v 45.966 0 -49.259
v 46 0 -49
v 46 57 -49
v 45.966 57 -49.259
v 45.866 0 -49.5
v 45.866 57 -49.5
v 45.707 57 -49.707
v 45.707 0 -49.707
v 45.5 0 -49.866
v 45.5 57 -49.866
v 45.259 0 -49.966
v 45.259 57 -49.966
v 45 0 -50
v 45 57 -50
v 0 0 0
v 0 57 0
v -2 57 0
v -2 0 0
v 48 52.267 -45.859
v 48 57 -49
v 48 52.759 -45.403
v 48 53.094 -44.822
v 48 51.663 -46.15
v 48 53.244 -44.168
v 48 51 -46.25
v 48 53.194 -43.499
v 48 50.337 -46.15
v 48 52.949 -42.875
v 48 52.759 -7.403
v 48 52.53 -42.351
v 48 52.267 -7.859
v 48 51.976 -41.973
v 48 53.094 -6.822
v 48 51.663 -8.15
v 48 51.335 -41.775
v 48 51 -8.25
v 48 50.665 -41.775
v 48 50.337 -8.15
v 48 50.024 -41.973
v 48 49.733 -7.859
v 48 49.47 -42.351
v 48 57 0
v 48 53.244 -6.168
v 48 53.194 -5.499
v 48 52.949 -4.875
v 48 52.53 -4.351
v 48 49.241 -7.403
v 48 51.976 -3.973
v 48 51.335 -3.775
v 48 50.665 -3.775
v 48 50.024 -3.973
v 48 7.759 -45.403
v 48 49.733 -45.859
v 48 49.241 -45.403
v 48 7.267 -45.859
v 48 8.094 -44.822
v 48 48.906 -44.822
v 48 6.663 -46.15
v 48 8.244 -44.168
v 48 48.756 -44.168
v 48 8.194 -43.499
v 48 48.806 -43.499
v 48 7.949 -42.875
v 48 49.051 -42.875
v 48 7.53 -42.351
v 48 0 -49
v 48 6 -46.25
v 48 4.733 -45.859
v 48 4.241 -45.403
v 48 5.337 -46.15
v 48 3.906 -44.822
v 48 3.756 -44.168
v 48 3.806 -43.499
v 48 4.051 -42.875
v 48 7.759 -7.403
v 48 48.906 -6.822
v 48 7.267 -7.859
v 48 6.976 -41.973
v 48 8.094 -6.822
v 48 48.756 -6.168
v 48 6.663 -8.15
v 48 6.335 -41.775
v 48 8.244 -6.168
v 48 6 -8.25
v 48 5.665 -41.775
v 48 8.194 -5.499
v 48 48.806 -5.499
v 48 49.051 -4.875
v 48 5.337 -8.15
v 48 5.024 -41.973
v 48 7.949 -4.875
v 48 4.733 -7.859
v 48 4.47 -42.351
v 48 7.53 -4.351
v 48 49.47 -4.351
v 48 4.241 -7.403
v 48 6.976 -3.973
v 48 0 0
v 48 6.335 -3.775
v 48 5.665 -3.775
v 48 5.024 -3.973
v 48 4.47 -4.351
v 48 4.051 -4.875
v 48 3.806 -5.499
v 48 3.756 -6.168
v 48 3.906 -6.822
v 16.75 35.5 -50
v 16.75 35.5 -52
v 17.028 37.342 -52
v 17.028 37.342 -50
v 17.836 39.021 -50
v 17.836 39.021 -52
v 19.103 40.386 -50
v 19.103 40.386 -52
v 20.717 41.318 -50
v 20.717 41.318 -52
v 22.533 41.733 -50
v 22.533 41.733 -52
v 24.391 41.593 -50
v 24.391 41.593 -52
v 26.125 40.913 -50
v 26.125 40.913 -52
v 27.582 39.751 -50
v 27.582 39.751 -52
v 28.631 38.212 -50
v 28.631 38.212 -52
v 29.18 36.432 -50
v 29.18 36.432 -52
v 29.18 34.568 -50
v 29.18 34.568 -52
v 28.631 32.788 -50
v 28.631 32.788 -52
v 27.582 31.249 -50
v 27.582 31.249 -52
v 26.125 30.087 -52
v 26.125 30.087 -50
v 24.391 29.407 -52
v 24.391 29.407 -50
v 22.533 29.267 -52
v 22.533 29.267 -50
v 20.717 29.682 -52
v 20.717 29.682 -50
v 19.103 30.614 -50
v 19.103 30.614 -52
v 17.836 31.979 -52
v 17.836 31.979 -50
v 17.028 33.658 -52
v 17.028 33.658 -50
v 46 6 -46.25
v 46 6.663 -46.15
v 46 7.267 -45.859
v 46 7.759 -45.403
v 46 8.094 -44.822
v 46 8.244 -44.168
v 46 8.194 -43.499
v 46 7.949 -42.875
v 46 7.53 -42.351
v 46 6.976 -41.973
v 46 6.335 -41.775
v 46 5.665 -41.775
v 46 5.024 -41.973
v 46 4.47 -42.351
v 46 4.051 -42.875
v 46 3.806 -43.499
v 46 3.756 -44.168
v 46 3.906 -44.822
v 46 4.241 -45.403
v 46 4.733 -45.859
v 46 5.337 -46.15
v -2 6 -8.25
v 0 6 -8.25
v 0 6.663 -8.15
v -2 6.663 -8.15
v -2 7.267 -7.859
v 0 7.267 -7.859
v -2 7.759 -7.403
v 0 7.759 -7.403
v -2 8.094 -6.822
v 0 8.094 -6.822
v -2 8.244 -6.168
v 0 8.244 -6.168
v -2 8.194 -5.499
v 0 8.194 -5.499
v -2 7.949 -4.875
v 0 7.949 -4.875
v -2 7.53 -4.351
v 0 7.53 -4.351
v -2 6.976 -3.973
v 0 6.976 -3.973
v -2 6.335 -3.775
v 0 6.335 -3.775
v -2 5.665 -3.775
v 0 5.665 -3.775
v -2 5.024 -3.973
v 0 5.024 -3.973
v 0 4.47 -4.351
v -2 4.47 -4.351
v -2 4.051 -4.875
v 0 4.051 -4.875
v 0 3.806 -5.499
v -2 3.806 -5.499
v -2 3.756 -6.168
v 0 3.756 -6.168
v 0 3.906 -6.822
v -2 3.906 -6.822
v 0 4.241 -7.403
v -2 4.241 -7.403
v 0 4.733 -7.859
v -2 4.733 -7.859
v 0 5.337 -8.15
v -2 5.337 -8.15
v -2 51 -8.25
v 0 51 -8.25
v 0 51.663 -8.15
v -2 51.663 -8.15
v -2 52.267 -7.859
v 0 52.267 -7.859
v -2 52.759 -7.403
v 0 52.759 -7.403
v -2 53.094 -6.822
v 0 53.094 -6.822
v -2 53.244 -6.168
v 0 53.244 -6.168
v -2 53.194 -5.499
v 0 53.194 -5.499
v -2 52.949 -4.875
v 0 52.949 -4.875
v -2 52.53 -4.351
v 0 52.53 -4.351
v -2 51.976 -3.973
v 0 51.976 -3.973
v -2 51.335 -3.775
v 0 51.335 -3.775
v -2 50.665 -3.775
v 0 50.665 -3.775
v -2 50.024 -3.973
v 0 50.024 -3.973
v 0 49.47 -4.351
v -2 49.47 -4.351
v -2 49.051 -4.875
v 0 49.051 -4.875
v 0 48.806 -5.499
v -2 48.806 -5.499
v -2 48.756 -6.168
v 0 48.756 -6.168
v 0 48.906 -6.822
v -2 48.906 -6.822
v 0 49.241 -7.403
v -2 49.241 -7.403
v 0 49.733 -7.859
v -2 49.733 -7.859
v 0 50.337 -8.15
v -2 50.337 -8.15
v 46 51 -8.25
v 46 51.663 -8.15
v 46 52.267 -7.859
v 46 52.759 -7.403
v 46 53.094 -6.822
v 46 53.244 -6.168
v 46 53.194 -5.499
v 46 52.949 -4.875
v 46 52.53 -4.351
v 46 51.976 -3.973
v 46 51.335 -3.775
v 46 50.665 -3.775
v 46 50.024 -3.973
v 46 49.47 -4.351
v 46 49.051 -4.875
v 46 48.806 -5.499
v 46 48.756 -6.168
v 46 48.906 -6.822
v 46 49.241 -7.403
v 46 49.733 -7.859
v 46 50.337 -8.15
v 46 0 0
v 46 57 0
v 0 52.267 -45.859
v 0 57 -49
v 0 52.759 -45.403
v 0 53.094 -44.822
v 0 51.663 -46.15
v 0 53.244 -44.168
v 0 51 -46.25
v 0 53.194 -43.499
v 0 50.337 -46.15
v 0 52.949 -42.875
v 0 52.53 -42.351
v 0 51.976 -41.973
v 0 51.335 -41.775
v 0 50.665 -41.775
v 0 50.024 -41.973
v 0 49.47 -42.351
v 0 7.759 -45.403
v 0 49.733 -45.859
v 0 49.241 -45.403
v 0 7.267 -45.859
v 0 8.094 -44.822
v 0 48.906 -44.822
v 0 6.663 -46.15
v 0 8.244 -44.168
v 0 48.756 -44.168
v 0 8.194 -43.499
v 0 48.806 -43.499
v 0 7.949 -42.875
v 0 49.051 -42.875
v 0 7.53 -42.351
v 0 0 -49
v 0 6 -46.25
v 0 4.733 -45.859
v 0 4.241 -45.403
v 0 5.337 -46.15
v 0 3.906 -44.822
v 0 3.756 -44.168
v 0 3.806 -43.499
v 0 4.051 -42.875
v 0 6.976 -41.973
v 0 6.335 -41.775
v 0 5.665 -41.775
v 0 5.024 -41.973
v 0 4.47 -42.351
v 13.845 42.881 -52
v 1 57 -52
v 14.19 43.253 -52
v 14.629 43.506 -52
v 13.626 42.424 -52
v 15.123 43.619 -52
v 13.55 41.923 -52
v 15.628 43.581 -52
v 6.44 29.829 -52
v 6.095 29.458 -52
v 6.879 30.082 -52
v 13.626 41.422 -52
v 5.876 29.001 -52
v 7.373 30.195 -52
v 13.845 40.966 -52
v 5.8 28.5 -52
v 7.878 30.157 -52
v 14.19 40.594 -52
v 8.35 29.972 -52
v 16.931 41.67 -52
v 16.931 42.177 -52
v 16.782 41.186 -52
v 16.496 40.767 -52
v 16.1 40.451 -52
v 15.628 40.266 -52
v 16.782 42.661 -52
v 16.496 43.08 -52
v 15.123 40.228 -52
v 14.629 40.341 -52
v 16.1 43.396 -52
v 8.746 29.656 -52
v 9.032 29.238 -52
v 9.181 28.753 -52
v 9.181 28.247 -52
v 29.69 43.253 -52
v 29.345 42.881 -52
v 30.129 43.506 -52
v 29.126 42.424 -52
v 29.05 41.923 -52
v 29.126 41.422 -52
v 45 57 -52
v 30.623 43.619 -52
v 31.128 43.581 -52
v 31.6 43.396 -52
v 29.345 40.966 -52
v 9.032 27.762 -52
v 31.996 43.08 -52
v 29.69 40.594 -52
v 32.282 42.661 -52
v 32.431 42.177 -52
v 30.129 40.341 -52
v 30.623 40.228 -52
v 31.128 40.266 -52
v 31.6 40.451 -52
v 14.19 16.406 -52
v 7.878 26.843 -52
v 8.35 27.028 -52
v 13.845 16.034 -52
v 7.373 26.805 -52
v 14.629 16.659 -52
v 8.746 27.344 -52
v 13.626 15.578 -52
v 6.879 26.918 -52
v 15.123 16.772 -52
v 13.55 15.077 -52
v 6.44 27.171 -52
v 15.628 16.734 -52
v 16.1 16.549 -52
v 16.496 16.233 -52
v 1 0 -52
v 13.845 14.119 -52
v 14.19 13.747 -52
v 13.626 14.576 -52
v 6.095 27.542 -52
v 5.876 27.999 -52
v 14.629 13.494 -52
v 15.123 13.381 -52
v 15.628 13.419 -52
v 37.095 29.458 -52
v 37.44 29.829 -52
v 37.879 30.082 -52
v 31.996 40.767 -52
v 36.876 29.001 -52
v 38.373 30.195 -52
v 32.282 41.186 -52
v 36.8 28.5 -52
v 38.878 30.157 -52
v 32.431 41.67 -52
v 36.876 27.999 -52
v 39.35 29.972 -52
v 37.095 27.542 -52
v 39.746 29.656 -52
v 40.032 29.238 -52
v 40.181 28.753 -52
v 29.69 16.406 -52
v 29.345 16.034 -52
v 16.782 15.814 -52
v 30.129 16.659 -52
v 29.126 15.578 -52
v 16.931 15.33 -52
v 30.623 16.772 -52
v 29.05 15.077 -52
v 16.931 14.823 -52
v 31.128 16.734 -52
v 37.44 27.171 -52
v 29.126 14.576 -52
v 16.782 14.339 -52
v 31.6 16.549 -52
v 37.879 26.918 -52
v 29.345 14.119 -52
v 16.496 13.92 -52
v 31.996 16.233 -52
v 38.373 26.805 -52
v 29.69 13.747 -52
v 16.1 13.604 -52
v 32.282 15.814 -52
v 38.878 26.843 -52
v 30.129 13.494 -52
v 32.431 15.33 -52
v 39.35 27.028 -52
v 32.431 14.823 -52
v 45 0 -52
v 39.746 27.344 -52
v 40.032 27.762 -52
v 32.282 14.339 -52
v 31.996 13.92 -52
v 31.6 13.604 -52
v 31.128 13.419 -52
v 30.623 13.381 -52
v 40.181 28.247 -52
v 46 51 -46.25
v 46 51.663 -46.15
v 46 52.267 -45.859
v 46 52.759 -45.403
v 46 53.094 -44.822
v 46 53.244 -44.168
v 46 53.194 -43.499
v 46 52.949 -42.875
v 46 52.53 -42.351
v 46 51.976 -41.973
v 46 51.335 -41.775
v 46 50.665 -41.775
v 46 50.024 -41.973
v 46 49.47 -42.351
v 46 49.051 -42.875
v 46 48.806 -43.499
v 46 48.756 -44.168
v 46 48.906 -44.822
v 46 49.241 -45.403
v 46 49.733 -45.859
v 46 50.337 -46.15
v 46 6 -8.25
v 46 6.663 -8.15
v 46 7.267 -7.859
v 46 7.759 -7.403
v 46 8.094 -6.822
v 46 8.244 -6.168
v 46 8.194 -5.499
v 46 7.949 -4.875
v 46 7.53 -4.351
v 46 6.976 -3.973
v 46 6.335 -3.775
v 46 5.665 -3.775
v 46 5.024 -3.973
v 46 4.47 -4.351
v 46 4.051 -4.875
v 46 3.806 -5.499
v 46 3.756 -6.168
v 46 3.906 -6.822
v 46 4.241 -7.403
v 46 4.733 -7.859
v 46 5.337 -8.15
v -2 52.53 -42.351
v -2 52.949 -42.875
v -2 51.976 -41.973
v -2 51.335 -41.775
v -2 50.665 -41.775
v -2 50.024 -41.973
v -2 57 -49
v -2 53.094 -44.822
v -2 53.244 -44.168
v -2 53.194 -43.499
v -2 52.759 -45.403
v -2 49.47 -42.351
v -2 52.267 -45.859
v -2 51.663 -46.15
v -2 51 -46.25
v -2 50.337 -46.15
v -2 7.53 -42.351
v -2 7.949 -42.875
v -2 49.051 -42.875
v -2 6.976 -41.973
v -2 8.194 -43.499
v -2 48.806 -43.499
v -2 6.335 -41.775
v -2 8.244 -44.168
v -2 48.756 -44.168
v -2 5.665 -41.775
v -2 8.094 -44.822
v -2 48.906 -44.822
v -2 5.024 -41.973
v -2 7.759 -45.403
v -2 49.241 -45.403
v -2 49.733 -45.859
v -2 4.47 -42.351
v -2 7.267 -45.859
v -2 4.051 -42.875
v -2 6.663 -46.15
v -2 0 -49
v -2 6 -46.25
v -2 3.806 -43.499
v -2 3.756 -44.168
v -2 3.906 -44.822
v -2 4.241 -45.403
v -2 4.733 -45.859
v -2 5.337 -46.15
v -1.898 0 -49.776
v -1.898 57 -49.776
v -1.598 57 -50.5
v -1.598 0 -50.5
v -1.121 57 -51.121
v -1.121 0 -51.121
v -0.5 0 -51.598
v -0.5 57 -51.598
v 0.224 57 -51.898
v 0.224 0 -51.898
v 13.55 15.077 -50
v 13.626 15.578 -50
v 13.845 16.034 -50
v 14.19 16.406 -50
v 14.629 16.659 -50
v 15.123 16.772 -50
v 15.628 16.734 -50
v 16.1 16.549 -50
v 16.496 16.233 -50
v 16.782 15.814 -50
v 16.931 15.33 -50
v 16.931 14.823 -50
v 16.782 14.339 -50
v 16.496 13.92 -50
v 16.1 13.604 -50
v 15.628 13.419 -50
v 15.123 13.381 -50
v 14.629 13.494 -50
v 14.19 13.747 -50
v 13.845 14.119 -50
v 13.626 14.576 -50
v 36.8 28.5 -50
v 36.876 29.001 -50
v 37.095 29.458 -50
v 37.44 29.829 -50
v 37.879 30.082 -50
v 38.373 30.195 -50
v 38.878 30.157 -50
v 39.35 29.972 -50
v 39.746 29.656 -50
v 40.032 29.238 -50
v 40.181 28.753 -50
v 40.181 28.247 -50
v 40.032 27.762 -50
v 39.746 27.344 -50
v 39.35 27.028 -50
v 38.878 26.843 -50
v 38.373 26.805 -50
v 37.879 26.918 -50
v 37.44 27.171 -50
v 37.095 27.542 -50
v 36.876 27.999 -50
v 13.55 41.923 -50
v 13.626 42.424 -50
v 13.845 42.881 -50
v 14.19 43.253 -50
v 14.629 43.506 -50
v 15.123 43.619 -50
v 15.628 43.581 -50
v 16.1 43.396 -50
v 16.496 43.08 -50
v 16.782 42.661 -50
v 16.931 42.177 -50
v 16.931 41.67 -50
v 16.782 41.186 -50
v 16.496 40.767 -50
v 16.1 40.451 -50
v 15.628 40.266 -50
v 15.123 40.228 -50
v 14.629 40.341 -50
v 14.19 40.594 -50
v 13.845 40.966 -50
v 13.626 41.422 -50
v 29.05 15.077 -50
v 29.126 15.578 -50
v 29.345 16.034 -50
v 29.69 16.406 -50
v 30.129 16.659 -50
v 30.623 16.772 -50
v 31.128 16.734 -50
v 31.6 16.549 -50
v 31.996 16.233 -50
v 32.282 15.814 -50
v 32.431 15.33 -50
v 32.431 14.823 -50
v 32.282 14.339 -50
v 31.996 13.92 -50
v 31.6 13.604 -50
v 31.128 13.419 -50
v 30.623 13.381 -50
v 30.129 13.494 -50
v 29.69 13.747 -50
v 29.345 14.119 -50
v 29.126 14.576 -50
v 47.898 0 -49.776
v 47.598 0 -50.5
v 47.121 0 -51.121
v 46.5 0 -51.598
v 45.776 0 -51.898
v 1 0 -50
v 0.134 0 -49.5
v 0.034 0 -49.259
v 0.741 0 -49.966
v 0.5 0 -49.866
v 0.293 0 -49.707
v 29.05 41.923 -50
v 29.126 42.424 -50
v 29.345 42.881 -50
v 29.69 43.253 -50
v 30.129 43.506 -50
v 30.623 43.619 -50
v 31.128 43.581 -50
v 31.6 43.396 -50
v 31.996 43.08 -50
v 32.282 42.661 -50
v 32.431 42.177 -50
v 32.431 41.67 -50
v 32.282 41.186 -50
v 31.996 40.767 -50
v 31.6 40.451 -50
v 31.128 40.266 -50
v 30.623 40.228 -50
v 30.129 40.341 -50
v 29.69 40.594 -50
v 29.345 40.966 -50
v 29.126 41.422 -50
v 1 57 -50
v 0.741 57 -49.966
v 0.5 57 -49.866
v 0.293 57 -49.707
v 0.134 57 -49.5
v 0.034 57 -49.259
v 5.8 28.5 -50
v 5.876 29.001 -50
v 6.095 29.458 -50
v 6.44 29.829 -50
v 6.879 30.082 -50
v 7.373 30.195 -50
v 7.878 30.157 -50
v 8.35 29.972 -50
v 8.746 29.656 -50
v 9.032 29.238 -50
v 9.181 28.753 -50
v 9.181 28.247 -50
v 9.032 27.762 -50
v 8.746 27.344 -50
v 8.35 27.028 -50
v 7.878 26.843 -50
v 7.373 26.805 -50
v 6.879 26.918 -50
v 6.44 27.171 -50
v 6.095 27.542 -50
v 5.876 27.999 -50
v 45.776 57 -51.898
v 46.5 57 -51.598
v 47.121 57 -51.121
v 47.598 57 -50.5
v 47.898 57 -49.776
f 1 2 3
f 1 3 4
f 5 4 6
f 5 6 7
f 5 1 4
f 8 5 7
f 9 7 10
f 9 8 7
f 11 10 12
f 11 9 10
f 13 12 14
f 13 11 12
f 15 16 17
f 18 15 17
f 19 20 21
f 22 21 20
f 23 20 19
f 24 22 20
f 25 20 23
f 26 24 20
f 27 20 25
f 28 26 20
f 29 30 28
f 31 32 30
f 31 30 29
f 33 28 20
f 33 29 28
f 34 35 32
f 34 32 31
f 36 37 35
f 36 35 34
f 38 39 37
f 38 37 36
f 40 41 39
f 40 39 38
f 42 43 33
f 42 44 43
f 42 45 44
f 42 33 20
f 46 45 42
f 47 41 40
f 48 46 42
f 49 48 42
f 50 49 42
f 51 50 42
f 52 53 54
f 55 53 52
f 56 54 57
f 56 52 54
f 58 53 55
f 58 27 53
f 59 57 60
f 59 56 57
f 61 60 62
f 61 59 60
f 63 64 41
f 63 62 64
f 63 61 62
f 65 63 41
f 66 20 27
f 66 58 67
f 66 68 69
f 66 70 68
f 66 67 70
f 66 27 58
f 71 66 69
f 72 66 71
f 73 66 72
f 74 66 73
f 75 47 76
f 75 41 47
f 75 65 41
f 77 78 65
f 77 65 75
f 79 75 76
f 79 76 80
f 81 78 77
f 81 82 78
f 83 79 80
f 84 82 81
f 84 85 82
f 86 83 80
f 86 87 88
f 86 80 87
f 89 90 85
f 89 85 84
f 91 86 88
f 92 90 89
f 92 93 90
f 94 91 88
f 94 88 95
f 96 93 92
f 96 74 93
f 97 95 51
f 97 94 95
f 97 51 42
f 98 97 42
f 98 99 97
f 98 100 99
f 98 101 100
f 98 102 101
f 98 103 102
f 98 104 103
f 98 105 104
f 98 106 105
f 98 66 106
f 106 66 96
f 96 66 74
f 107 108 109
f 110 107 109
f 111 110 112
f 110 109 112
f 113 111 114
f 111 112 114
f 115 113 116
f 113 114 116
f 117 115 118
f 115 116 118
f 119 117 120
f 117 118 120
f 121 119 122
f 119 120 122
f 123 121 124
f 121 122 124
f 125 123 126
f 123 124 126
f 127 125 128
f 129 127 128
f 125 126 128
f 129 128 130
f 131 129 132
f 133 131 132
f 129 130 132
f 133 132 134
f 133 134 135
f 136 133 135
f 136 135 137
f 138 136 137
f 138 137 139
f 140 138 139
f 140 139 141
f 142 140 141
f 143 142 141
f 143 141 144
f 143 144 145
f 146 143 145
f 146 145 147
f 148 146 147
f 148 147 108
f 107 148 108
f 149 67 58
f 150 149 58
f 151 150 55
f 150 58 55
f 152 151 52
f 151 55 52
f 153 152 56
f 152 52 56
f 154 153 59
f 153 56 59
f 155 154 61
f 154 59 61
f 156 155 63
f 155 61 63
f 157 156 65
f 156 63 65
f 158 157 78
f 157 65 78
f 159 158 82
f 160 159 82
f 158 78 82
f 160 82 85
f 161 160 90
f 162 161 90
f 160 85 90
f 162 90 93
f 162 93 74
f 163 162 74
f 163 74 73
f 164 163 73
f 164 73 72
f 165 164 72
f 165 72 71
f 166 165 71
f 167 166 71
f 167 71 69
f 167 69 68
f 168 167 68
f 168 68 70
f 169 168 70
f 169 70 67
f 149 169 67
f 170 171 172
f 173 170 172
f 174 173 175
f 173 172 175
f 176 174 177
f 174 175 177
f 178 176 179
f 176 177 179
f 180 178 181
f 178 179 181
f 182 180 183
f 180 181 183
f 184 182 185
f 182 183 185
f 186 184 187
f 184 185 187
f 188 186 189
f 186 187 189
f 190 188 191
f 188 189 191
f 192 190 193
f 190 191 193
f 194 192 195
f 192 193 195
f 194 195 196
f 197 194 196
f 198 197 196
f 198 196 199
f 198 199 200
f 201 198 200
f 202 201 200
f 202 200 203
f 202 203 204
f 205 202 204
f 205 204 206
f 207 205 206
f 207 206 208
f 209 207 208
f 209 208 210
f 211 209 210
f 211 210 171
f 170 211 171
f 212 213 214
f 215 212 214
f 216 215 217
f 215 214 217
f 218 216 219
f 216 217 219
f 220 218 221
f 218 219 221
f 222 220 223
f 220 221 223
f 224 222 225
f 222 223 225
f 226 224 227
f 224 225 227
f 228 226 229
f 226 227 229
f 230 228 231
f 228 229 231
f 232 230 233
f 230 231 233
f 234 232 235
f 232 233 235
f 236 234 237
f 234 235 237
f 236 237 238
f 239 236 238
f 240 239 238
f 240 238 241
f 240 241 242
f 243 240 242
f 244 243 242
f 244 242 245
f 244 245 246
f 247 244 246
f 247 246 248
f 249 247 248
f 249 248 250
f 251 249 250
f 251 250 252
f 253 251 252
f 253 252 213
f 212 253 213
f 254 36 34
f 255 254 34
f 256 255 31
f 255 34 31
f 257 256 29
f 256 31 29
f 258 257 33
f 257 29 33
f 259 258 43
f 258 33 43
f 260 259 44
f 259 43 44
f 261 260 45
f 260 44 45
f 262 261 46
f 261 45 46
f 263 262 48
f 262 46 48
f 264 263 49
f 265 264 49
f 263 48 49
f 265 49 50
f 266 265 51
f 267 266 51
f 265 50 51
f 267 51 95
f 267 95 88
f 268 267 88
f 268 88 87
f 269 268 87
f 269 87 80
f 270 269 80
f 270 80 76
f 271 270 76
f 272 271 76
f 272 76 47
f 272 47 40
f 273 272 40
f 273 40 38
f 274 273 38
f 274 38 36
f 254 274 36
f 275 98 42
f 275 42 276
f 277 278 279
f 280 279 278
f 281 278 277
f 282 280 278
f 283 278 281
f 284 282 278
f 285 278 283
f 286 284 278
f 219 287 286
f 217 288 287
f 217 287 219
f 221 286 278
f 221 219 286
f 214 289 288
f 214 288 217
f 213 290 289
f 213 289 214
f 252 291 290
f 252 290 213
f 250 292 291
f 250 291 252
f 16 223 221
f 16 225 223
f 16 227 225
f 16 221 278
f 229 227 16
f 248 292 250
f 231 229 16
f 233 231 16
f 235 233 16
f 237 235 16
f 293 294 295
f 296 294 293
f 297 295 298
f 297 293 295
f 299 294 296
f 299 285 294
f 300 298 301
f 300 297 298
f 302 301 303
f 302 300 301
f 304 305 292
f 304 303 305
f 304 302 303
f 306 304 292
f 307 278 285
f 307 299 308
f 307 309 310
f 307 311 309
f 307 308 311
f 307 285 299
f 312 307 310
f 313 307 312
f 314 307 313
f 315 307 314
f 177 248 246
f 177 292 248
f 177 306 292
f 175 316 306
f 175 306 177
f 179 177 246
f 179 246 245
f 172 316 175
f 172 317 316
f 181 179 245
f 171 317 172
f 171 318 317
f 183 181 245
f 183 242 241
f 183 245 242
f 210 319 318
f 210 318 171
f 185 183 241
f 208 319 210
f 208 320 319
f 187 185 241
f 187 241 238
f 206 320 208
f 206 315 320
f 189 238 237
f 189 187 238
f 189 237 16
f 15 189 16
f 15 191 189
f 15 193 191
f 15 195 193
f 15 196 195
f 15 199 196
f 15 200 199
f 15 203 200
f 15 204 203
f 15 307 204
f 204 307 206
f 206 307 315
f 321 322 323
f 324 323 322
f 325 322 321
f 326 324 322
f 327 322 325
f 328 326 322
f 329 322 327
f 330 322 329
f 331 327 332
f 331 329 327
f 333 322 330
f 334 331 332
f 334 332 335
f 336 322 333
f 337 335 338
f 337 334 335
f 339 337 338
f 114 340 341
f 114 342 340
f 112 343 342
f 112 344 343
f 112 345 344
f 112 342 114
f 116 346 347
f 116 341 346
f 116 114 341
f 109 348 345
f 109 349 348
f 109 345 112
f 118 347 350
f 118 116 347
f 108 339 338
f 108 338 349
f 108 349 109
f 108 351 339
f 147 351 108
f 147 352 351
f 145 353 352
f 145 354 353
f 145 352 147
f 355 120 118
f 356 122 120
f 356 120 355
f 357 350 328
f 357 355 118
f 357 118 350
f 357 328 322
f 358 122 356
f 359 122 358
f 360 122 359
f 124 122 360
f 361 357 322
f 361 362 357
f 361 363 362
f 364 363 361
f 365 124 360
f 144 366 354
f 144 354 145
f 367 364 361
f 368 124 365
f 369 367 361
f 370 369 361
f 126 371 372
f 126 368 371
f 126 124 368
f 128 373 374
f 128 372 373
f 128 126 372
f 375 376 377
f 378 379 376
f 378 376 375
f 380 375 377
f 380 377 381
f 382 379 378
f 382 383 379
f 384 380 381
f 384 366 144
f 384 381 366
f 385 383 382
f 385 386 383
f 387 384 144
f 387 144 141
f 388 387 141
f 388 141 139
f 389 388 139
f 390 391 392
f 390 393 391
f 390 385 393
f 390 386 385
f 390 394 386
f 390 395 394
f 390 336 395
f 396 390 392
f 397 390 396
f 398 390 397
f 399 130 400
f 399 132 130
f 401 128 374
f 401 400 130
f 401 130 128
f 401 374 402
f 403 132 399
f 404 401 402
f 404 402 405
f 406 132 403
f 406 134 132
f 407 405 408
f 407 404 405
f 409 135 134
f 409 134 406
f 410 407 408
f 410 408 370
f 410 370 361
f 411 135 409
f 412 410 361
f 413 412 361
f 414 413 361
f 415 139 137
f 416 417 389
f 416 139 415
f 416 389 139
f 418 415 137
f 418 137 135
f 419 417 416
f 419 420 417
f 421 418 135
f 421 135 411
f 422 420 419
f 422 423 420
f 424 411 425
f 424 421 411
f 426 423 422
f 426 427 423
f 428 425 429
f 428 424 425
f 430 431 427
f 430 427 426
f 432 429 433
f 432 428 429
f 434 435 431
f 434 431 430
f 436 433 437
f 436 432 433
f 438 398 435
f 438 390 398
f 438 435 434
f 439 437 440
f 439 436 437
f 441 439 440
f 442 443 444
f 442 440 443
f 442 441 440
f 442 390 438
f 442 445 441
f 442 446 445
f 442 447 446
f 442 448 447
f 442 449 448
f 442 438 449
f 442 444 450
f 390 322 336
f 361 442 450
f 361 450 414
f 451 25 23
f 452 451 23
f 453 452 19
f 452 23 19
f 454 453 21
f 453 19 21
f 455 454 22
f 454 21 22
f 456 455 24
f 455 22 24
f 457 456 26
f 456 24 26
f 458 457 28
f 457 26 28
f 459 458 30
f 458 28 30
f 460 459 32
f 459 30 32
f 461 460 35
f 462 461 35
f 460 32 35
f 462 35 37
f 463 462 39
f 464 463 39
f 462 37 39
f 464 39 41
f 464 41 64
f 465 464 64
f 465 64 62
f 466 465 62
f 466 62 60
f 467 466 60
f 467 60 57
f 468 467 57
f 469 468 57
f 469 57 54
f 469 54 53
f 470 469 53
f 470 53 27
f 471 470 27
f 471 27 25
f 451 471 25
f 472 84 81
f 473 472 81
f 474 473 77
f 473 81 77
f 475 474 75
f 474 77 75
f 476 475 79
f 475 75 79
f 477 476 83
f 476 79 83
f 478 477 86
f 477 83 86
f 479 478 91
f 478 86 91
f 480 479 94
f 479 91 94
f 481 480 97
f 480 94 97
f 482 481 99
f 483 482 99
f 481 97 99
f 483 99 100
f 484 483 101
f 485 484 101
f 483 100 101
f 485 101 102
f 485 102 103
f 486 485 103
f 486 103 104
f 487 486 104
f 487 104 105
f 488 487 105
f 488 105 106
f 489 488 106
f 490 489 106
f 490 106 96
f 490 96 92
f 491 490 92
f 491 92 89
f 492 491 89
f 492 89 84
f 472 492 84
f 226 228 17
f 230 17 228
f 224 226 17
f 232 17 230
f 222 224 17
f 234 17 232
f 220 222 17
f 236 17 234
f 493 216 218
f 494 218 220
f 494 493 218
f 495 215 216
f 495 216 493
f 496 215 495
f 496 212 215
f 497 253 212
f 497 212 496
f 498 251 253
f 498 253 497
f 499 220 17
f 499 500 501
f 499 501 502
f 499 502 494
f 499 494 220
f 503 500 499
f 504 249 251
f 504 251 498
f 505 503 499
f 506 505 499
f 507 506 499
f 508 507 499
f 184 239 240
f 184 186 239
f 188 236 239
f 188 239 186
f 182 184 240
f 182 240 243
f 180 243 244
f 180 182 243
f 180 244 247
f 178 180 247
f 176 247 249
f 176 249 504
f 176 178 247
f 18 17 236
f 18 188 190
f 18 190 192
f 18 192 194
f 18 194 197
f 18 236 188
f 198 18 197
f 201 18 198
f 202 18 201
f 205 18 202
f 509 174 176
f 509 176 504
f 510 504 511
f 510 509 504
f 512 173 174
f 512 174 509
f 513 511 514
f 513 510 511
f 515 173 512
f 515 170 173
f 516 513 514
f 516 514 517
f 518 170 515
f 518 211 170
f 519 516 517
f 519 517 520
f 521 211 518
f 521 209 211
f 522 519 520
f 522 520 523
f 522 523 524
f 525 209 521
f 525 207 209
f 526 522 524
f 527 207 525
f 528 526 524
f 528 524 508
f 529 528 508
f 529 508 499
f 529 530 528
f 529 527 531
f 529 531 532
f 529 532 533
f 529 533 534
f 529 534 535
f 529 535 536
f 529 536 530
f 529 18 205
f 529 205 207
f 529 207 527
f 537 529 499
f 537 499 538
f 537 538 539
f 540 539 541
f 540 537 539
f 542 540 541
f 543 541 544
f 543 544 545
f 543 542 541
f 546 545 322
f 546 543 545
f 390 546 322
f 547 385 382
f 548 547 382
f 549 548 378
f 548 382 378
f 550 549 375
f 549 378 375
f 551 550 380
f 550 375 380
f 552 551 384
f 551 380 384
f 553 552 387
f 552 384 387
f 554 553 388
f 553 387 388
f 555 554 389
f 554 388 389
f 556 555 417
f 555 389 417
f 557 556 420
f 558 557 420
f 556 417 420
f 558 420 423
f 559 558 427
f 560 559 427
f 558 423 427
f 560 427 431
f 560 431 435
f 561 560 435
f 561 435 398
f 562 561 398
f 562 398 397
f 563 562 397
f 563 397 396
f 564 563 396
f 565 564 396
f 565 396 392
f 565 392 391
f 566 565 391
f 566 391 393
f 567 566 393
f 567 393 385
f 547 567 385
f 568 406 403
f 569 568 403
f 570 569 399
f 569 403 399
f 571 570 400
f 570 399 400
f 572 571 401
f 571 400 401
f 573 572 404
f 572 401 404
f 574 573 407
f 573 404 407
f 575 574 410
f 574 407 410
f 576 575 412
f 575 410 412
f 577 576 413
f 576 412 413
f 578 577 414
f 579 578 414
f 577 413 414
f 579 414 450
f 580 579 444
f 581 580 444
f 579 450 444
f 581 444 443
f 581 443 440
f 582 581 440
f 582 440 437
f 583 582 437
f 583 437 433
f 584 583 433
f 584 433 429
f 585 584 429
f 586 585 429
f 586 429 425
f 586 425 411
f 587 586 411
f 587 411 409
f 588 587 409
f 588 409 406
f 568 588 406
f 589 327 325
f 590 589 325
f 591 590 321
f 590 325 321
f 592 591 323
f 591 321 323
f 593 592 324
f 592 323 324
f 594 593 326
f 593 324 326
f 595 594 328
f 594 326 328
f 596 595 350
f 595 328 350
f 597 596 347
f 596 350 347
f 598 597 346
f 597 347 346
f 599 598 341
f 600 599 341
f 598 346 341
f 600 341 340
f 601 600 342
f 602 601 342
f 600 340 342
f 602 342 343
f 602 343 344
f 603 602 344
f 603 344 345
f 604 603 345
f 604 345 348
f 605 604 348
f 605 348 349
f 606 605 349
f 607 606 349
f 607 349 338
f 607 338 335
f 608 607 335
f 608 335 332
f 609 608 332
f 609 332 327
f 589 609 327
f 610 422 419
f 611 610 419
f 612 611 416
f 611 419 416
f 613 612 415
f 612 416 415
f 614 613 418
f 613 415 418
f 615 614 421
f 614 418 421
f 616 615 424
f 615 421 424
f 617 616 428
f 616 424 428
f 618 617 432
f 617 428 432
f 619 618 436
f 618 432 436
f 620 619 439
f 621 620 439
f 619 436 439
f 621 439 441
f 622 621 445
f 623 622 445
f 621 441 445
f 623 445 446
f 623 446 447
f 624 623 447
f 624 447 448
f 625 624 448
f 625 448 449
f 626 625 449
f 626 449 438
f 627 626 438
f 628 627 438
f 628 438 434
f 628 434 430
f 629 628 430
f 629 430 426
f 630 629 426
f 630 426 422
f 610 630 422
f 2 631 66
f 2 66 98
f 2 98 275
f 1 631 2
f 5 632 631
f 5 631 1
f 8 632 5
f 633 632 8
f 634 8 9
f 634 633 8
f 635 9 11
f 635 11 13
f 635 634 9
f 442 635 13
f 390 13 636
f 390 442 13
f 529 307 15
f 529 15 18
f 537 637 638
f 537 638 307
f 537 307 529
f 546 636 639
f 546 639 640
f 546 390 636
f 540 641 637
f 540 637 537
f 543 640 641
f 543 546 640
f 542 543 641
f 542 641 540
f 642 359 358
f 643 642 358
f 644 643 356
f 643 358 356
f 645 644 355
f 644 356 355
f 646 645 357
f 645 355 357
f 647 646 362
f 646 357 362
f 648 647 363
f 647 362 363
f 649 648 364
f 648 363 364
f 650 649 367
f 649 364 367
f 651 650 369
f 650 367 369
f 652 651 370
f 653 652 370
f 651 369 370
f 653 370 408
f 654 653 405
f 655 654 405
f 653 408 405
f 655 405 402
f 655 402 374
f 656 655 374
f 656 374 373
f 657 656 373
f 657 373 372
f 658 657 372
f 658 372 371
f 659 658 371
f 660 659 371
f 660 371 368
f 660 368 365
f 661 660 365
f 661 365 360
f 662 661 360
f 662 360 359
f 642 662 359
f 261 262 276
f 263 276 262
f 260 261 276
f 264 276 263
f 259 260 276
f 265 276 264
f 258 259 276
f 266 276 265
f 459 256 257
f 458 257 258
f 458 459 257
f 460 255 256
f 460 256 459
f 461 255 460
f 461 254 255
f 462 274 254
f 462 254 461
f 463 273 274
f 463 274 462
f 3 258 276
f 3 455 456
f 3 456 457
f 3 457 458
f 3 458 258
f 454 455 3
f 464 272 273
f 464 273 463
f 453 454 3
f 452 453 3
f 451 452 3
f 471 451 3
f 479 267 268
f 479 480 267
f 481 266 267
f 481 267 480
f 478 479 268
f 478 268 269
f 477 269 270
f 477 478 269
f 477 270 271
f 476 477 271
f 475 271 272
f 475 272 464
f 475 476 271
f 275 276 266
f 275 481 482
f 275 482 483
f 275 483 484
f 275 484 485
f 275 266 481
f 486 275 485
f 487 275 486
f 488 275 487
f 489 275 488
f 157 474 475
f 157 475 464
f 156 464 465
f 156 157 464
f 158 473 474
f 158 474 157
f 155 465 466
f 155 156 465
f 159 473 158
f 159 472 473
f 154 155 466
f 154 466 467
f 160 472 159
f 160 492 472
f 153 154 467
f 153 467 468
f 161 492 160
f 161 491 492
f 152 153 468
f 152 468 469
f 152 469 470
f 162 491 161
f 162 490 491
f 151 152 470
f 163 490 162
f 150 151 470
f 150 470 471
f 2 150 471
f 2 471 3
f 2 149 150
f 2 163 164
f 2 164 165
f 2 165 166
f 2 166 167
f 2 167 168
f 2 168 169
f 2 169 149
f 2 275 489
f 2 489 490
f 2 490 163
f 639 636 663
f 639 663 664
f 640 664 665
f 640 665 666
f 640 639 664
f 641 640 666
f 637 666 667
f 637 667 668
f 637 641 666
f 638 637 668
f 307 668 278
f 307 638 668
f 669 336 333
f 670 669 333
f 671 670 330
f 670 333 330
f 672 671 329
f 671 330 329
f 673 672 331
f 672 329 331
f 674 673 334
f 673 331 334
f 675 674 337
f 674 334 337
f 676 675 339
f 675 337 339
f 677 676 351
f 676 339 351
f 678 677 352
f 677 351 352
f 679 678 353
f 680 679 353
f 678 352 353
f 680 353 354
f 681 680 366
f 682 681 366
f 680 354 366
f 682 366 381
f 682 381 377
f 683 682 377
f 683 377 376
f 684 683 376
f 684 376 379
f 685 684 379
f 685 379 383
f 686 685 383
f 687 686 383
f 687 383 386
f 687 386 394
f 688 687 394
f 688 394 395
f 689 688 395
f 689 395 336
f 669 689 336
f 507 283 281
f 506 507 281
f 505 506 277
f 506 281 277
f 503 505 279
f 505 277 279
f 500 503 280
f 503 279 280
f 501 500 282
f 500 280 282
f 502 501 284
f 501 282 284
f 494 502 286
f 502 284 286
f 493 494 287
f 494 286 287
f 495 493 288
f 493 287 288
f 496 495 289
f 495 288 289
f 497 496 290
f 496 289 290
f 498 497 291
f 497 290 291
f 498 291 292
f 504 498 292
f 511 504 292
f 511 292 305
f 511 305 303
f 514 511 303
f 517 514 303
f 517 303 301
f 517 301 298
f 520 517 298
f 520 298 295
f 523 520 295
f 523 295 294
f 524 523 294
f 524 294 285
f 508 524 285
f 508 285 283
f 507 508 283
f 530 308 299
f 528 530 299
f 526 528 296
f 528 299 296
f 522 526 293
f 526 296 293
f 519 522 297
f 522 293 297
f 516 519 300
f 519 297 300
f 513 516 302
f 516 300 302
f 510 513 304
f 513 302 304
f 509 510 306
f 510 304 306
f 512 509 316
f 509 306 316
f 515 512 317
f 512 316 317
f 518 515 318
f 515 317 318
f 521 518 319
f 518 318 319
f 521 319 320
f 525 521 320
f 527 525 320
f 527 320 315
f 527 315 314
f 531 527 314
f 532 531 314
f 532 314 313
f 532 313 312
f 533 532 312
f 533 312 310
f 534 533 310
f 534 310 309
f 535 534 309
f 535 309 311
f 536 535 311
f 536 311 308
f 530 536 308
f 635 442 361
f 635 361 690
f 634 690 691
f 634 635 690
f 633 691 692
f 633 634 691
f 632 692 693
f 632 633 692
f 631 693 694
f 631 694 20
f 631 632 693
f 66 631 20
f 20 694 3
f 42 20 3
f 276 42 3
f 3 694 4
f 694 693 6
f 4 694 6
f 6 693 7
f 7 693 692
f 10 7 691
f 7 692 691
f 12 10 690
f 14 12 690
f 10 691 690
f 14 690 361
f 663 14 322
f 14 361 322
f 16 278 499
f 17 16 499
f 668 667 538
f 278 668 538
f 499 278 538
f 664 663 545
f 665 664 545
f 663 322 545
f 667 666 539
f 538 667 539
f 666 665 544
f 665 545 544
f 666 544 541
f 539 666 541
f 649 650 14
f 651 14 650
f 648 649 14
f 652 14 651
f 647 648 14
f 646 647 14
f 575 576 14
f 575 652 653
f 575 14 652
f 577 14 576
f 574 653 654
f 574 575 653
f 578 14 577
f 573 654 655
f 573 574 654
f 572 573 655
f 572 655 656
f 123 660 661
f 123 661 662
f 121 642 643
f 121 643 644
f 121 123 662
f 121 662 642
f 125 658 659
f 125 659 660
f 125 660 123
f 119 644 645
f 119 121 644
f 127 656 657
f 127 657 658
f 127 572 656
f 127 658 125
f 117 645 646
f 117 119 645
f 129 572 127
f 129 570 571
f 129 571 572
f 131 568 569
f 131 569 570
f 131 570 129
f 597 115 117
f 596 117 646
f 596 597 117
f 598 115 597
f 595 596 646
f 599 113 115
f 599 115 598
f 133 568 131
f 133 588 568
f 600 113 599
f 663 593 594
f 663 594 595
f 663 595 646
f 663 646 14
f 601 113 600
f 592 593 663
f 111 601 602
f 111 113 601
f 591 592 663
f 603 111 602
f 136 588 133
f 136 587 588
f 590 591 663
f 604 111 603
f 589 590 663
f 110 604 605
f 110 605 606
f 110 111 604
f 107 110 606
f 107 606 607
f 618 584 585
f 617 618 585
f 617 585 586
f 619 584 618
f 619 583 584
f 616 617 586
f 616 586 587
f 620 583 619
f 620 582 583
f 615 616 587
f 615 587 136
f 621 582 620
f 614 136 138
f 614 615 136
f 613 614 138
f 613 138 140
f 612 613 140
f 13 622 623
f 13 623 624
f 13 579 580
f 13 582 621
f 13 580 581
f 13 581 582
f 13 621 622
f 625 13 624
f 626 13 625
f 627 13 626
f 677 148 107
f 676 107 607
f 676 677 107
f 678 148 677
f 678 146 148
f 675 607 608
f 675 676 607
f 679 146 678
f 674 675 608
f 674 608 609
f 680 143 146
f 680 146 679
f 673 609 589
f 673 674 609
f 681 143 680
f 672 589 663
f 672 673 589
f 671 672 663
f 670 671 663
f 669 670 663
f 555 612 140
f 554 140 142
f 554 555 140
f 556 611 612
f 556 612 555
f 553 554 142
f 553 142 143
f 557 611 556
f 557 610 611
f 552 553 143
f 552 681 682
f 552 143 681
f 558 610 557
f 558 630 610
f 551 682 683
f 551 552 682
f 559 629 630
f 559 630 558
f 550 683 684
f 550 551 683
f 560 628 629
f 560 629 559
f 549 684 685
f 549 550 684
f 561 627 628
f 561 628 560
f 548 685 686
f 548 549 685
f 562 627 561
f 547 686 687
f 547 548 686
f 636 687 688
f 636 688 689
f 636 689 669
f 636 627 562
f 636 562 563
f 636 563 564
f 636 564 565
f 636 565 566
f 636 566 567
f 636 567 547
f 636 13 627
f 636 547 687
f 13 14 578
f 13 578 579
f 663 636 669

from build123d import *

# Parameters (mm, degrees)
BOSS_EXTRUDE1_DEPTH = 57
SKETCH2_R           = 2.25
CUT_EXTRUDE1_DEPTH  = 92.940197955
SKETCH3_R           = 1.7
SKETCH3_R_2         = 6.25
CUT_EXTRUDE2_DEPTH  = 52


with BuildPart() as part:
    # Sketch1 → Boss-Extrude1 (new body)
    with BuildSketch(Plane(origin=(0, 0, 0), x_dir=(1, 0, 0), z_dir=(0, 1, 0))):
        with BuildLine():
            Line((-2, 0), (-2, 49))
            ThreePointArc((-2, 49), (-1.121320344, 51.121320344), (1, 52))
            Line((1, 52), (45, 52))
            ThreePointArc((45, 52), (47.121320344, 51.121320344), (48, 49))
            Line((48, 49), (48, 0))
            Line((48, 0), (46, 0))
            Line((46, 0), (46, 49))
            ThreePointArc((46, 49), (45.707106781, 49.707106781), (45, 50))
            Line((45, 50), (1, 50))
            ThreePointArc((1, 50), (0.292893219, 49.707106781), (0, 49))
            Line((0, 49), (0, 0))
            Line((0, 0), (-2, 0))
        make_face()
    extrude(amount=BOSS_EXTRUDE1_DEPTH)

    # Sketch2 → Cut-Extrude1 (cut, through all)
    with BuildSketch(Plane(origin=(48, 0, 0), x_dir=(0, 0, -1), z_dir=(1, 0, 0))):
        with Locations((6, 51)):
            Circle(SKETCH2_R)
        with Locations((44, 51)):
            Circle(SKETCH2_R)
        with Locations((6, 6)):
            Circle(SKETCH2_R)
        with Locations((44, 6)):
            Circle(SKETCH2_R)
    extrude(amount=-CUT_EXTRUDE1_DEPTH, mode=Mode.SUBTRACT)

    # Sketch3 → Cut-Extrude2 (cut)
    with BuildSketch(Plane(origin=(0, 0, -52), x_dir=(-1, 0, 0), z_dir=(0, 0, -1))):
        with Locations((-38.5, 28.5)):
            Circle(SKETCH3_R)
        with Locations((-30.75, 41.923393759)):
            Circle(SKETCH3_R)
        with Locations((-15.25, 41.923393759)):
            Circle(SKETCH3_R)
        with Locations((-7.5, 28.5)):
            Circle(SKETCH3_R)
        with Locations((-15.25, 15.076606241)):
            Circle(SKETCH3_R)
        with Locations((-30.75, 15.076606241)):
            Circle(SKETCH3_R)
        with Locations((-23, 35.5)):
            Circle(SKETCH3_R_2)
    extrude(amount=-CUT_EXTRUDE2_DEPTH, mode=Mode.SUBTRACT)


solid = part.part
